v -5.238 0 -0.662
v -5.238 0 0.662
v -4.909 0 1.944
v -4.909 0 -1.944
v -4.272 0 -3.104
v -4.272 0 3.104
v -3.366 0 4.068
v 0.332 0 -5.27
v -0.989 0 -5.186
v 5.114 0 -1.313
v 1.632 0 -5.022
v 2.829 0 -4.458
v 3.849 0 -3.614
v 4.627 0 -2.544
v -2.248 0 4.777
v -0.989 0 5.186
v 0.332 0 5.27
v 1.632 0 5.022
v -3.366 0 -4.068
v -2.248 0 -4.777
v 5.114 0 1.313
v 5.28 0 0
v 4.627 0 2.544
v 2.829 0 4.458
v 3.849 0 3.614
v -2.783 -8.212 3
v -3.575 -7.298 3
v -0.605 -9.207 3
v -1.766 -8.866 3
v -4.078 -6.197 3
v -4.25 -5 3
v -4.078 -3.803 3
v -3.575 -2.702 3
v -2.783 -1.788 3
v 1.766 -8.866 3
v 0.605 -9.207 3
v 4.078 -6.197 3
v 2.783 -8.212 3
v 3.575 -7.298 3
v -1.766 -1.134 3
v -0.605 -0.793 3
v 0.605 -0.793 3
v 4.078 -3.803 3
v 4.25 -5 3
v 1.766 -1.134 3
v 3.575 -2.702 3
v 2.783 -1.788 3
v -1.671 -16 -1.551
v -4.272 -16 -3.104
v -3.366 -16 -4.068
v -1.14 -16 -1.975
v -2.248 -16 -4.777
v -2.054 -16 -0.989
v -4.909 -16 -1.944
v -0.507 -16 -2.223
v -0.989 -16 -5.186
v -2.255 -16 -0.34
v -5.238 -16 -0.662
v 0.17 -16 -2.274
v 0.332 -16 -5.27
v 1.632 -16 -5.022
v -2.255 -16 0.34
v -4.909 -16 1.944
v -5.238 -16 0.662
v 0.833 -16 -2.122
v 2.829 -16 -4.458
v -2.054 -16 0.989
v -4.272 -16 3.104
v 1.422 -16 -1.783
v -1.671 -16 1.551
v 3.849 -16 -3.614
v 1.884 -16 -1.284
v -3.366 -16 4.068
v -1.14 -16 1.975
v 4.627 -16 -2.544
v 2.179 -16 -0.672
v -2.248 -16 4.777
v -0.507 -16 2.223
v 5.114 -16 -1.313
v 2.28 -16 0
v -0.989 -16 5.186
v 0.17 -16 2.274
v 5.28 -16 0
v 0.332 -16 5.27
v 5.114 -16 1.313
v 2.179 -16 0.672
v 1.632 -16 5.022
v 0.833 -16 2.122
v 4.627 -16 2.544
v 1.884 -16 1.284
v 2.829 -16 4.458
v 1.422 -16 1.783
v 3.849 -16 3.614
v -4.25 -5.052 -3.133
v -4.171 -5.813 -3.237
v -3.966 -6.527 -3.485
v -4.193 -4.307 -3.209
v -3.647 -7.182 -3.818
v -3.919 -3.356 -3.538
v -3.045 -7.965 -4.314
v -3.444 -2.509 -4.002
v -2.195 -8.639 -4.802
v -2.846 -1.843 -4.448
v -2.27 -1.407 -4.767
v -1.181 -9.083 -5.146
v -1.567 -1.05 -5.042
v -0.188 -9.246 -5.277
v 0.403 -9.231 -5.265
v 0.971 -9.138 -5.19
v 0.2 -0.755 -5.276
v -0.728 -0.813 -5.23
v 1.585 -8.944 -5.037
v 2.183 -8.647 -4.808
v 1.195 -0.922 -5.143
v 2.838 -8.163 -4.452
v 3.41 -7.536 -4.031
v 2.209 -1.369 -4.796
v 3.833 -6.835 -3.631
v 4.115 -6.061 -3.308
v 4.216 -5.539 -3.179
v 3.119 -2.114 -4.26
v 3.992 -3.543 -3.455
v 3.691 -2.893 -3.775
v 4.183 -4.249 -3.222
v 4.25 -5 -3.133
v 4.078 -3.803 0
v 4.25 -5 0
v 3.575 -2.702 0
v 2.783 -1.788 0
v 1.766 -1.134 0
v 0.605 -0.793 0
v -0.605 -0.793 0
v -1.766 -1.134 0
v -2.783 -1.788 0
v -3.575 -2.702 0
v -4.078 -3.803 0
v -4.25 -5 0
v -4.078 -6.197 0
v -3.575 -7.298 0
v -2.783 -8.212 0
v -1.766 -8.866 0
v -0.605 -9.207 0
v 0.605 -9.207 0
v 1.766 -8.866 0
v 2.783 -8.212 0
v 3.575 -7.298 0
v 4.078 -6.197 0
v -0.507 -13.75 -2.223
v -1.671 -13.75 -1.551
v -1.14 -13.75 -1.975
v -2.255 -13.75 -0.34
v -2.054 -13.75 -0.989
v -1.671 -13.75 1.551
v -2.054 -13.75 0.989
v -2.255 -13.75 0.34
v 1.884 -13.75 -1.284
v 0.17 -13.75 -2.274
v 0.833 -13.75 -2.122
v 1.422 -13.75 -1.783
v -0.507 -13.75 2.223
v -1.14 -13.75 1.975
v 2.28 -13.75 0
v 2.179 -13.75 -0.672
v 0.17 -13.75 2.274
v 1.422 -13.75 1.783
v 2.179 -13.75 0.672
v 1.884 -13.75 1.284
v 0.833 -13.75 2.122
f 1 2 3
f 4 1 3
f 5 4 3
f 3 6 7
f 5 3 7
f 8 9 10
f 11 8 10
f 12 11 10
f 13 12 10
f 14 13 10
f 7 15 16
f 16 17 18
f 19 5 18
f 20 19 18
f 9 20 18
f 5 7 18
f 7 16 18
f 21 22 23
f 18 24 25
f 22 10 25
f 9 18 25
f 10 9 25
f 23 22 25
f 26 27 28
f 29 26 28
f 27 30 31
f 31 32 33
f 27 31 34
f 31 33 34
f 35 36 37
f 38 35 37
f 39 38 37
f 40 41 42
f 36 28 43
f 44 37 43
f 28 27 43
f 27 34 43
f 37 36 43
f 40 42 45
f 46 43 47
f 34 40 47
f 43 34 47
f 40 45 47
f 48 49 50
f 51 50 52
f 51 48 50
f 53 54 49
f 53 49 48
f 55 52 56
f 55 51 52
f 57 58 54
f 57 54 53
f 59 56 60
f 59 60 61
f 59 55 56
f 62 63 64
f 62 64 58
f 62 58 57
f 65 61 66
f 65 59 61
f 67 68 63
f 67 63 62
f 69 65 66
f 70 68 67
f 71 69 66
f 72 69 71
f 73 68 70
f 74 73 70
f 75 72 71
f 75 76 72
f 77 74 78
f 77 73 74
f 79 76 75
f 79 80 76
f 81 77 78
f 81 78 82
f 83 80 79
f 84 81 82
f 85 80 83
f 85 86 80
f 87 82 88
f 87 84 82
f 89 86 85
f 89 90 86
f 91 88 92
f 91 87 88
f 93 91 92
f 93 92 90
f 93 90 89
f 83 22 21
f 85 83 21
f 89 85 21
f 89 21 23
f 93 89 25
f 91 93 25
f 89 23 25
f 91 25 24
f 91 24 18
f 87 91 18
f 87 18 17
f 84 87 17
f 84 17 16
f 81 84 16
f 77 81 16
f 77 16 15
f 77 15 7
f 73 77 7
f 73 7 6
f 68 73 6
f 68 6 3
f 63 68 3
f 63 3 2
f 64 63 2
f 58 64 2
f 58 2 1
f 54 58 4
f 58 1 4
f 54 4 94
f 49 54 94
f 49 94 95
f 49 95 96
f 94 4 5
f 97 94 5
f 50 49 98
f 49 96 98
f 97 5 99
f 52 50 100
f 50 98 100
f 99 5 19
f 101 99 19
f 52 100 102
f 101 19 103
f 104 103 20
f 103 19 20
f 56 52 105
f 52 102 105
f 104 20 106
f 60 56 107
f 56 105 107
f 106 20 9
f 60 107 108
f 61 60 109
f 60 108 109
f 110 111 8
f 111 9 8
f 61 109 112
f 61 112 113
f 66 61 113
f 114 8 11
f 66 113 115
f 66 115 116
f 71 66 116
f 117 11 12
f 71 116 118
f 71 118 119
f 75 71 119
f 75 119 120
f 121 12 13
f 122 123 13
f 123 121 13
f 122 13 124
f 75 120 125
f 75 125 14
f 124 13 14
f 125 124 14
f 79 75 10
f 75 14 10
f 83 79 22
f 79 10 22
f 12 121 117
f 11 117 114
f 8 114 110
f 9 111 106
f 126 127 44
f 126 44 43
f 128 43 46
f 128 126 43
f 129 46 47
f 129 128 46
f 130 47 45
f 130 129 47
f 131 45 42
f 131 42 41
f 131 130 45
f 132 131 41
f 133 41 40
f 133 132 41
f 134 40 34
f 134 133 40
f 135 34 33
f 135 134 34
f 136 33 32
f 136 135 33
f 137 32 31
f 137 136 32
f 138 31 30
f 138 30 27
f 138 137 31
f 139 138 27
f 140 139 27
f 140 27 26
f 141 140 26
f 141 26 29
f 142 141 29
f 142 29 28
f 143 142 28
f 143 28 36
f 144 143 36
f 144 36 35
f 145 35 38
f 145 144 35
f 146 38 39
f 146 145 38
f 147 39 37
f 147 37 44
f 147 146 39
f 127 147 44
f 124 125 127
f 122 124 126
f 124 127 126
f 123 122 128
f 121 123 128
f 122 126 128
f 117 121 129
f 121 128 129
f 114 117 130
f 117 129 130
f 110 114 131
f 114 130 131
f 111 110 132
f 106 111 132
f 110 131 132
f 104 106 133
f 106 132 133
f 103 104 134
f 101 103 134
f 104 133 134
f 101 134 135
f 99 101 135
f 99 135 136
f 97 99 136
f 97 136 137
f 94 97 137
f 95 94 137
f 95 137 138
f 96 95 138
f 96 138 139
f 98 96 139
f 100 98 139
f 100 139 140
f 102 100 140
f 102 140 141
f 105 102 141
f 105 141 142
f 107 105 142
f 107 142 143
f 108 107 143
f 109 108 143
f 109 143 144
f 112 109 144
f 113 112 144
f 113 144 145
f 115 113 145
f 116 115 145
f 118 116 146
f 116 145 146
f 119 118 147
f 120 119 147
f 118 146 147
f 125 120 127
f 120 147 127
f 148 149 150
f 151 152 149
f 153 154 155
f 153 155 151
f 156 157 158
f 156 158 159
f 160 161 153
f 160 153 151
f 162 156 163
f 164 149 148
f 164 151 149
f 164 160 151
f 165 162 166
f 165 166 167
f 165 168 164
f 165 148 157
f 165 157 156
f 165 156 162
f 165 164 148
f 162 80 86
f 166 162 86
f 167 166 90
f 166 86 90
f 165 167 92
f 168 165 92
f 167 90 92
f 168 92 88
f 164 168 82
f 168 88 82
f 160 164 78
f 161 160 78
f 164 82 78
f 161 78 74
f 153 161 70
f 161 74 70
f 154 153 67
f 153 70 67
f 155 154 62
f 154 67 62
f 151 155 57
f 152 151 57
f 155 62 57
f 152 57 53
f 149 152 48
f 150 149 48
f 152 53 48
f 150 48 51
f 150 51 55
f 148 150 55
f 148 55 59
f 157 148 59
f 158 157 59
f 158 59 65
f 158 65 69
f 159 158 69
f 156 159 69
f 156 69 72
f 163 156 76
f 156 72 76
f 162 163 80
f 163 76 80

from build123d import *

# Parameters (mm, degrees)
F0_R          = 5.28
F1_DEPTH      = 16
F2_R          = 2.28
F3_DEPTH      = 2.25
F4_R          = 4.25
F5_DEPTH      = 25
F5_DEPTH_BACK = 3


with BuildPart() as f1:
    # F0 (on Front) → F1 (new body)
    with BuildSketch(Plane.XZ):
        Circle(F0_R)
    extrude(amount=F1_DEPTH)

    # F2 (on face) → F3 (cut)
    with BuildSketch(Plane.XZ.offset(16)):
        Circle(F2_R)
    extrude(amount=-F3_DEPTH, mode=Mode.SUBTRACT)

    # F4 (on Top) → F5 (cut, two sides)
    with BuildSketch(Plane.XY) as f5_sk:
        with Locations((0, -5)):
            Circle(F4_R)
    extrude(amount=-F5_DEPTH, mode=Mode.SUBTRACT)
    extrude(f5_sk.sketch, amount=F5_DEPTH_BACK, mode=Mode.SUBTRACT)


solid = f1.part
